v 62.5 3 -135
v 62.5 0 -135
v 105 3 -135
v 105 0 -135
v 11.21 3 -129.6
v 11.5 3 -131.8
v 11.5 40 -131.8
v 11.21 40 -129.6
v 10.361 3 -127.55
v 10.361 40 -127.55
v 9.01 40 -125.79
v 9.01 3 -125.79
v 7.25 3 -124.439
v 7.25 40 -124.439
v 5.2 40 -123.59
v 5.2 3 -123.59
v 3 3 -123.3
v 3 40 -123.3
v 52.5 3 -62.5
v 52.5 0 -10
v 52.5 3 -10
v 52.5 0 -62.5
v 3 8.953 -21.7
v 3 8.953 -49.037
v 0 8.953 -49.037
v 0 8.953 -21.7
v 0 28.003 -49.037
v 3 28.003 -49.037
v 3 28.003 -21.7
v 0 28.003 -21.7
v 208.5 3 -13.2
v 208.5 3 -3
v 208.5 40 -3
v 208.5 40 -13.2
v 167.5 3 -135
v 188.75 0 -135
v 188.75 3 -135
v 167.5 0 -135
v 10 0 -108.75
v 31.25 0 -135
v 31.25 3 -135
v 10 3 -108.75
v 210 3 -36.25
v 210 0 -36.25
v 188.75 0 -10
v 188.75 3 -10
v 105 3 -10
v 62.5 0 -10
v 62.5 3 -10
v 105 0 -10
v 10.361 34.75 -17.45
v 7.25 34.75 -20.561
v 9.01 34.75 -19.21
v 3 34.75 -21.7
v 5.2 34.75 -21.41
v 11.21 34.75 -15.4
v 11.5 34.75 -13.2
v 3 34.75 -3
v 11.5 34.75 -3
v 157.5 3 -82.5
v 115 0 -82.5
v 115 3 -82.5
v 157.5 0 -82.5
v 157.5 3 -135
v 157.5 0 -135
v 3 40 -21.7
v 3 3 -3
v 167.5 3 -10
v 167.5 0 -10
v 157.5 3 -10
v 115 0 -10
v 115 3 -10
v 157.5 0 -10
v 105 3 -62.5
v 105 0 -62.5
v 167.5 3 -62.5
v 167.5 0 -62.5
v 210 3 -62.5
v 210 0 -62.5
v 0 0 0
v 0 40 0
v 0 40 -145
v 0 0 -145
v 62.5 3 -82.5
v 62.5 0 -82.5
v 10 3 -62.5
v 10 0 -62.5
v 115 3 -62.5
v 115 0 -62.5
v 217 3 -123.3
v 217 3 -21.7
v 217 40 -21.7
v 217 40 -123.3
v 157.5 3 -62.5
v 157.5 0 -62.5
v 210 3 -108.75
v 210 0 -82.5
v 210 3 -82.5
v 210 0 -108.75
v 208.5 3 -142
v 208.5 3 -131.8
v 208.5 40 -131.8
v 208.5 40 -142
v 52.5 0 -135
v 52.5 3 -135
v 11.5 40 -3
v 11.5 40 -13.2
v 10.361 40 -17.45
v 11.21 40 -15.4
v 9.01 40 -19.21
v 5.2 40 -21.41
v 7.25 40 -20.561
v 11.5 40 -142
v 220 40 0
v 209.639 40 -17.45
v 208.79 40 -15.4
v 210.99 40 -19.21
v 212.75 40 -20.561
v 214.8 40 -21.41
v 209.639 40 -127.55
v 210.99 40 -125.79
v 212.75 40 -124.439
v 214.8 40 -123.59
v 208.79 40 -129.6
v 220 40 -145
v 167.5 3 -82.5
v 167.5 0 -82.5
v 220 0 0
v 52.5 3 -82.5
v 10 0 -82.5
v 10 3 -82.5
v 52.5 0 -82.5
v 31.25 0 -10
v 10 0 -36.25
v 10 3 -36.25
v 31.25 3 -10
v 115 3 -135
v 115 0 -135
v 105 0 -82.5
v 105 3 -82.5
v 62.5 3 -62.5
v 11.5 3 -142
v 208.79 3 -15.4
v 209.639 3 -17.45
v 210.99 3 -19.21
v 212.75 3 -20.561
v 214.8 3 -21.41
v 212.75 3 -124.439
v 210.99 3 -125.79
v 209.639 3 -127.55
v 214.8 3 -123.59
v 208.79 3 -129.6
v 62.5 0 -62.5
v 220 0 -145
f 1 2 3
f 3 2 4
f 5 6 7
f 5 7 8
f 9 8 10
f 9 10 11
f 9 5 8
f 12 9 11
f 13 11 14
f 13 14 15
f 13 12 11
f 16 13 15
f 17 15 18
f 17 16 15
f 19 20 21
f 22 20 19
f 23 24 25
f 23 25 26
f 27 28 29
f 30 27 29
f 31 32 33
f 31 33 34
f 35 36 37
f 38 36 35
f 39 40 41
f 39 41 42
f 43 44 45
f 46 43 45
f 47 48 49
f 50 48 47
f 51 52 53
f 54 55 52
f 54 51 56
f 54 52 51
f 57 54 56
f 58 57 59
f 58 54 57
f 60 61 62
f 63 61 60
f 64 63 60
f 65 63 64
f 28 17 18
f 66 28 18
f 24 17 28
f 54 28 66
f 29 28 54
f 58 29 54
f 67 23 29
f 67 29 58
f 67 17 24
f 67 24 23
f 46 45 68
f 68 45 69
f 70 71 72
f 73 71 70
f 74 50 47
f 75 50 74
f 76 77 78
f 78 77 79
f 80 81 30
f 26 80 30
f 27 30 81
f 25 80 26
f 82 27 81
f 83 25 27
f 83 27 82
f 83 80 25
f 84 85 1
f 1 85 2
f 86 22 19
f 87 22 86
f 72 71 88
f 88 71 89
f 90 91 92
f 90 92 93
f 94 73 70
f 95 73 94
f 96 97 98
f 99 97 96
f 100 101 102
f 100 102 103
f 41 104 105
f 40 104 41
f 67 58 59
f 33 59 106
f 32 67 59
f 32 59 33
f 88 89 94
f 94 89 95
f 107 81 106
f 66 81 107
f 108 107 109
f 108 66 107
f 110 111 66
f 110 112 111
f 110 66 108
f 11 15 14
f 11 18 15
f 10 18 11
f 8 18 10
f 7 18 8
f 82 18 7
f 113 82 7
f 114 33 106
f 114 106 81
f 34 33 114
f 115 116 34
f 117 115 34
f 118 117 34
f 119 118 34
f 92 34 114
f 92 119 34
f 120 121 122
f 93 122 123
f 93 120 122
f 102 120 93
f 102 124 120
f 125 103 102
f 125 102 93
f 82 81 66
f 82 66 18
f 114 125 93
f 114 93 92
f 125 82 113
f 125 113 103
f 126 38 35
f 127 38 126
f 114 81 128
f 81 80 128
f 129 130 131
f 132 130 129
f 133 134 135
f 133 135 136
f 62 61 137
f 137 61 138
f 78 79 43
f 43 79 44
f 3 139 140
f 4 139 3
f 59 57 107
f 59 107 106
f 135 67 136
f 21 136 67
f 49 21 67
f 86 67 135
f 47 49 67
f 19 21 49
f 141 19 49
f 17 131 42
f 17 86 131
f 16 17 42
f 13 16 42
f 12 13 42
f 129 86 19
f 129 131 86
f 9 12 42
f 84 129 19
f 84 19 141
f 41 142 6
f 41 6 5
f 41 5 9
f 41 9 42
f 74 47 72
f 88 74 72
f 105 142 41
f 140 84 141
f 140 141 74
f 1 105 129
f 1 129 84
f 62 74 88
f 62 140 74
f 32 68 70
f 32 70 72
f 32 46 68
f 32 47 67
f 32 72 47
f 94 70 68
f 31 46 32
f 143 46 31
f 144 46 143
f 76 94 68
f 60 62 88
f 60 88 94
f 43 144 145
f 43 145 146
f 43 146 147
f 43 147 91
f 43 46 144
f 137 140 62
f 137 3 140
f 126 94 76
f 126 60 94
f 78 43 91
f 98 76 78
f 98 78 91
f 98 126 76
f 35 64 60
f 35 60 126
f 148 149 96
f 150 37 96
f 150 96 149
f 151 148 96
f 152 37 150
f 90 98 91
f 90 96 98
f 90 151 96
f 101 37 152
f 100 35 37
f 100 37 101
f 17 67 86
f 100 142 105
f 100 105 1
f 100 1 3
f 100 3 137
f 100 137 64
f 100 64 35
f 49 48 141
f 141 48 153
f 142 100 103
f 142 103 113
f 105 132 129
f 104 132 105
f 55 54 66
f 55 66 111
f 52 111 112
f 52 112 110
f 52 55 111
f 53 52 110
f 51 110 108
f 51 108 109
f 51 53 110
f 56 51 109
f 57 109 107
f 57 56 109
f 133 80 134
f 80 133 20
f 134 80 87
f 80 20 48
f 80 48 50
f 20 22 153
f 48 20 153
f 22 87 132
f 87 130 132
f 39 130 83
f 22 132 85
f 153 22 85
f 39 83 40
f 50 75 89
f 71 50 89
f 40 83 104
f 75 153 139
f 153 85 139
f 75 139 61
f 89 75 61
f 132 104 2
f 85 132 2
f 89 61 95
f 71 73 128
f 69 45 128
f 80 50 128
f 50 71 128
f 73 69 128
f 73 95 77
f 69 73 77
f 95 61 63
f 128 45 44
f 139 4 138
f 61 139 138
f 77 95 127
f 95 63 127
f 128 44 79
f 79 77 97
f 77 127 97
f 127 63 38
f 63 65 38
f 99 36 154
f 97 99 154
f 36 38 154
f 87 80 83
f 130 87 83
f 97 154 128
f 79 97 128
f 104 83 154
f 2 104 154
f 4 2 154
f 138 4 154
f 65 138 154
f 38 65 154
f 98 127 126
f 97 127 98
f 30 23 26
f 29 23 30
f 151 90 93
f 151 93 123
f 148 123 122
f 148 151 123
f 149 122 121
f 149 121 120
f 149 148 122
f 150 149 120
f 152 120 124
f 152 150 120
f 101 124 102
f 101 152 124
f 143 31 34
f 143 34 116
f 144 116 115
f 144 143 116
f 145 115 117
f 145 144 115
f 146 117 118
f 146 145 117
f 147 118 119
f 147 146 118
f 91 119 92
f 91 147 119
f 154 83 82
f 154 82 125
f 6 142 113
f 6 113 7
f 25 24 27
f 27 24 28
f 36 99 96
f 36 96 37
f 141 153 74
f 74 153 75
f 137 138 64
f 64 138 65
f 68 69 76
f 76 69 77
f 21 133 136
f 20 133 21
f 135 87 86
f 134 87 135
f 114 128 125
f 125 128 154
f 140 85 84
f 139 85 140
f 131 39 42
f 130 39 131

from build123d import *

# Parameters (mm, degrees)
SKETCH1_W           = 220
SKETCH1_H           = 145
SKETCH1_W_2         = 42.5
SKETCH1_H_2         = 52.5
BOSS_EXTRUDE1_DEPTH = 3
SKETCH2_W           = 220
SKETCH2_H           = 145
BOSS_EXTRUDE2_DEPTH = 37
SKETCH3_W           = 27.3375
SKETCH3_H           = 19.05
CUT_EXTRUDE1_DEPTH  = 3
SKETCH3_6_W         = 53.975
SKETCH3_6_H         = 31.75
CUT_EXTRUDE2_DEPTH  = 8.5


with BuildPart() as part:
    # Sketch1 → Boss-Extrude1 (new body)
    with BuildSketch(Plane(origin=(0, 0, 0), x_dir=(1, 0, 0), z_dir=(0, 1, 0))):
        with Locations((110, 72.5)):
            Rectangle(SKETCH1_W, SKETCH1_H)
        Polygon((10, 82.5), (52.5, 82.5), (52.5, 135), (31.25, 135), (10, 108.75), align=None, mode=Mode.SUBTRACT)
        with Locations((83.75, 108.75)):
            Rectangle(SKETCH1_W_2, SKETCH1_H_2, mode=Mode.SUBTRACT)
        with Locations((83.75, 36.25)):
            Rectangle(SKETCH1_W_2, SKETCH1_H_2, mode=Mode.SUBTRACT)
        Polygon((10, 36.25), (31.25, 10), (52.5, 10), (52.5, 62.5), (10, 62.5), align=None, mode=Mode.SUBTRACT)
        Polygon((210, 62.5), (210, 36.25), (188.75, 10), (167.5, 10), (167.5, 62.5), align=None, mode=Mode.SUBTRACT)
        with Locations((136.25, 36.25)):
            Rectangle(SKETCH1_W_2, SKETCH1_H_2, mode=Mode.SUBTRACT)
        with Locations((136.25, 108.75)):
            Rectangle(SKETCH1_W_2, SKETCH1_H_2, mode=Mode.SUBTRACT)
        Polygon((210, 108.75), (188.75, 135), (167.5, 135), (167.5, 82.5), (210, 82.5), align=None, mode=Mode.SUBTRACT)
    extrude(amount=BOSS_EXTRUDE1_DEPTH)

    # Sketch2 → Boss-Extrude2 (add)
    with BuildSketch(Plane(origin=(0, 3, 0), x_dir=(1, 0, 0), z_dir=(0, 1, 0))):
        with Locations((110, 72.5)):
            Rectangle(SKETCH2_W, SKETCH2_H)
        with BuildLine():
            Line((3, 123.3), (3, 21.7))
            ThreePointArc((3, 21.7), (9.01040764, 19.21040764), (11.5, 13.2))
            Line((11.5, 13.2), (11.5, 3))
            Line((11.5, 3), (208.5, 3))
            Line((208.5, 3), (208.5, 13.2))
            ThreePointArc((208.5, 13.2), (210.98959236, 19.21040764), (217, 21.7))
            Line((217, 21.7), (217, 123.3))
            ThreePointArc((217, 123.3), (210.98959236, 125.78959236), (208.5, 131.8))
            Line((208.5, 131.8), (208.5, 142))
            Line((208.5, 142), (11.5, 142))
            Line((11.5, 142), (11.5, 131.8))
            ThreePointArc((11.5, 131.8), (9.01040764, 125.78959236), (3, 123.3))
        make_face(mode=Mode.SUBTRACT)
    extrude(amount=BOSS_EXTRUDE2_DEPTH)

    # Sketch3 → Cut-Extrude1 (cut)
    with BuildSketch(Plane.ZY.offset(-3)):
        with Locations((-35.36875, 18.478125)):
            Rectangle(SKETCH3_W, SKETCH3_H)
    extrude(amount=CUT_EXTRUDE1_DEPTH, mode=Mode.SUBTRACT)

    # Sketch3<6> → Cut-Extrude2 (cut)
    with BuildSketch(Plane.ZY.offset(-3)):
        with Locations((-29.9875, 18.875)):
            Rectangle(SKETCH3_6_W, SKETCH3_6_H)
    extrude(amount=-CUT_EXTRUDE2_DEPTH, mode=Mode.SUBTRACT)


solid = part.part
